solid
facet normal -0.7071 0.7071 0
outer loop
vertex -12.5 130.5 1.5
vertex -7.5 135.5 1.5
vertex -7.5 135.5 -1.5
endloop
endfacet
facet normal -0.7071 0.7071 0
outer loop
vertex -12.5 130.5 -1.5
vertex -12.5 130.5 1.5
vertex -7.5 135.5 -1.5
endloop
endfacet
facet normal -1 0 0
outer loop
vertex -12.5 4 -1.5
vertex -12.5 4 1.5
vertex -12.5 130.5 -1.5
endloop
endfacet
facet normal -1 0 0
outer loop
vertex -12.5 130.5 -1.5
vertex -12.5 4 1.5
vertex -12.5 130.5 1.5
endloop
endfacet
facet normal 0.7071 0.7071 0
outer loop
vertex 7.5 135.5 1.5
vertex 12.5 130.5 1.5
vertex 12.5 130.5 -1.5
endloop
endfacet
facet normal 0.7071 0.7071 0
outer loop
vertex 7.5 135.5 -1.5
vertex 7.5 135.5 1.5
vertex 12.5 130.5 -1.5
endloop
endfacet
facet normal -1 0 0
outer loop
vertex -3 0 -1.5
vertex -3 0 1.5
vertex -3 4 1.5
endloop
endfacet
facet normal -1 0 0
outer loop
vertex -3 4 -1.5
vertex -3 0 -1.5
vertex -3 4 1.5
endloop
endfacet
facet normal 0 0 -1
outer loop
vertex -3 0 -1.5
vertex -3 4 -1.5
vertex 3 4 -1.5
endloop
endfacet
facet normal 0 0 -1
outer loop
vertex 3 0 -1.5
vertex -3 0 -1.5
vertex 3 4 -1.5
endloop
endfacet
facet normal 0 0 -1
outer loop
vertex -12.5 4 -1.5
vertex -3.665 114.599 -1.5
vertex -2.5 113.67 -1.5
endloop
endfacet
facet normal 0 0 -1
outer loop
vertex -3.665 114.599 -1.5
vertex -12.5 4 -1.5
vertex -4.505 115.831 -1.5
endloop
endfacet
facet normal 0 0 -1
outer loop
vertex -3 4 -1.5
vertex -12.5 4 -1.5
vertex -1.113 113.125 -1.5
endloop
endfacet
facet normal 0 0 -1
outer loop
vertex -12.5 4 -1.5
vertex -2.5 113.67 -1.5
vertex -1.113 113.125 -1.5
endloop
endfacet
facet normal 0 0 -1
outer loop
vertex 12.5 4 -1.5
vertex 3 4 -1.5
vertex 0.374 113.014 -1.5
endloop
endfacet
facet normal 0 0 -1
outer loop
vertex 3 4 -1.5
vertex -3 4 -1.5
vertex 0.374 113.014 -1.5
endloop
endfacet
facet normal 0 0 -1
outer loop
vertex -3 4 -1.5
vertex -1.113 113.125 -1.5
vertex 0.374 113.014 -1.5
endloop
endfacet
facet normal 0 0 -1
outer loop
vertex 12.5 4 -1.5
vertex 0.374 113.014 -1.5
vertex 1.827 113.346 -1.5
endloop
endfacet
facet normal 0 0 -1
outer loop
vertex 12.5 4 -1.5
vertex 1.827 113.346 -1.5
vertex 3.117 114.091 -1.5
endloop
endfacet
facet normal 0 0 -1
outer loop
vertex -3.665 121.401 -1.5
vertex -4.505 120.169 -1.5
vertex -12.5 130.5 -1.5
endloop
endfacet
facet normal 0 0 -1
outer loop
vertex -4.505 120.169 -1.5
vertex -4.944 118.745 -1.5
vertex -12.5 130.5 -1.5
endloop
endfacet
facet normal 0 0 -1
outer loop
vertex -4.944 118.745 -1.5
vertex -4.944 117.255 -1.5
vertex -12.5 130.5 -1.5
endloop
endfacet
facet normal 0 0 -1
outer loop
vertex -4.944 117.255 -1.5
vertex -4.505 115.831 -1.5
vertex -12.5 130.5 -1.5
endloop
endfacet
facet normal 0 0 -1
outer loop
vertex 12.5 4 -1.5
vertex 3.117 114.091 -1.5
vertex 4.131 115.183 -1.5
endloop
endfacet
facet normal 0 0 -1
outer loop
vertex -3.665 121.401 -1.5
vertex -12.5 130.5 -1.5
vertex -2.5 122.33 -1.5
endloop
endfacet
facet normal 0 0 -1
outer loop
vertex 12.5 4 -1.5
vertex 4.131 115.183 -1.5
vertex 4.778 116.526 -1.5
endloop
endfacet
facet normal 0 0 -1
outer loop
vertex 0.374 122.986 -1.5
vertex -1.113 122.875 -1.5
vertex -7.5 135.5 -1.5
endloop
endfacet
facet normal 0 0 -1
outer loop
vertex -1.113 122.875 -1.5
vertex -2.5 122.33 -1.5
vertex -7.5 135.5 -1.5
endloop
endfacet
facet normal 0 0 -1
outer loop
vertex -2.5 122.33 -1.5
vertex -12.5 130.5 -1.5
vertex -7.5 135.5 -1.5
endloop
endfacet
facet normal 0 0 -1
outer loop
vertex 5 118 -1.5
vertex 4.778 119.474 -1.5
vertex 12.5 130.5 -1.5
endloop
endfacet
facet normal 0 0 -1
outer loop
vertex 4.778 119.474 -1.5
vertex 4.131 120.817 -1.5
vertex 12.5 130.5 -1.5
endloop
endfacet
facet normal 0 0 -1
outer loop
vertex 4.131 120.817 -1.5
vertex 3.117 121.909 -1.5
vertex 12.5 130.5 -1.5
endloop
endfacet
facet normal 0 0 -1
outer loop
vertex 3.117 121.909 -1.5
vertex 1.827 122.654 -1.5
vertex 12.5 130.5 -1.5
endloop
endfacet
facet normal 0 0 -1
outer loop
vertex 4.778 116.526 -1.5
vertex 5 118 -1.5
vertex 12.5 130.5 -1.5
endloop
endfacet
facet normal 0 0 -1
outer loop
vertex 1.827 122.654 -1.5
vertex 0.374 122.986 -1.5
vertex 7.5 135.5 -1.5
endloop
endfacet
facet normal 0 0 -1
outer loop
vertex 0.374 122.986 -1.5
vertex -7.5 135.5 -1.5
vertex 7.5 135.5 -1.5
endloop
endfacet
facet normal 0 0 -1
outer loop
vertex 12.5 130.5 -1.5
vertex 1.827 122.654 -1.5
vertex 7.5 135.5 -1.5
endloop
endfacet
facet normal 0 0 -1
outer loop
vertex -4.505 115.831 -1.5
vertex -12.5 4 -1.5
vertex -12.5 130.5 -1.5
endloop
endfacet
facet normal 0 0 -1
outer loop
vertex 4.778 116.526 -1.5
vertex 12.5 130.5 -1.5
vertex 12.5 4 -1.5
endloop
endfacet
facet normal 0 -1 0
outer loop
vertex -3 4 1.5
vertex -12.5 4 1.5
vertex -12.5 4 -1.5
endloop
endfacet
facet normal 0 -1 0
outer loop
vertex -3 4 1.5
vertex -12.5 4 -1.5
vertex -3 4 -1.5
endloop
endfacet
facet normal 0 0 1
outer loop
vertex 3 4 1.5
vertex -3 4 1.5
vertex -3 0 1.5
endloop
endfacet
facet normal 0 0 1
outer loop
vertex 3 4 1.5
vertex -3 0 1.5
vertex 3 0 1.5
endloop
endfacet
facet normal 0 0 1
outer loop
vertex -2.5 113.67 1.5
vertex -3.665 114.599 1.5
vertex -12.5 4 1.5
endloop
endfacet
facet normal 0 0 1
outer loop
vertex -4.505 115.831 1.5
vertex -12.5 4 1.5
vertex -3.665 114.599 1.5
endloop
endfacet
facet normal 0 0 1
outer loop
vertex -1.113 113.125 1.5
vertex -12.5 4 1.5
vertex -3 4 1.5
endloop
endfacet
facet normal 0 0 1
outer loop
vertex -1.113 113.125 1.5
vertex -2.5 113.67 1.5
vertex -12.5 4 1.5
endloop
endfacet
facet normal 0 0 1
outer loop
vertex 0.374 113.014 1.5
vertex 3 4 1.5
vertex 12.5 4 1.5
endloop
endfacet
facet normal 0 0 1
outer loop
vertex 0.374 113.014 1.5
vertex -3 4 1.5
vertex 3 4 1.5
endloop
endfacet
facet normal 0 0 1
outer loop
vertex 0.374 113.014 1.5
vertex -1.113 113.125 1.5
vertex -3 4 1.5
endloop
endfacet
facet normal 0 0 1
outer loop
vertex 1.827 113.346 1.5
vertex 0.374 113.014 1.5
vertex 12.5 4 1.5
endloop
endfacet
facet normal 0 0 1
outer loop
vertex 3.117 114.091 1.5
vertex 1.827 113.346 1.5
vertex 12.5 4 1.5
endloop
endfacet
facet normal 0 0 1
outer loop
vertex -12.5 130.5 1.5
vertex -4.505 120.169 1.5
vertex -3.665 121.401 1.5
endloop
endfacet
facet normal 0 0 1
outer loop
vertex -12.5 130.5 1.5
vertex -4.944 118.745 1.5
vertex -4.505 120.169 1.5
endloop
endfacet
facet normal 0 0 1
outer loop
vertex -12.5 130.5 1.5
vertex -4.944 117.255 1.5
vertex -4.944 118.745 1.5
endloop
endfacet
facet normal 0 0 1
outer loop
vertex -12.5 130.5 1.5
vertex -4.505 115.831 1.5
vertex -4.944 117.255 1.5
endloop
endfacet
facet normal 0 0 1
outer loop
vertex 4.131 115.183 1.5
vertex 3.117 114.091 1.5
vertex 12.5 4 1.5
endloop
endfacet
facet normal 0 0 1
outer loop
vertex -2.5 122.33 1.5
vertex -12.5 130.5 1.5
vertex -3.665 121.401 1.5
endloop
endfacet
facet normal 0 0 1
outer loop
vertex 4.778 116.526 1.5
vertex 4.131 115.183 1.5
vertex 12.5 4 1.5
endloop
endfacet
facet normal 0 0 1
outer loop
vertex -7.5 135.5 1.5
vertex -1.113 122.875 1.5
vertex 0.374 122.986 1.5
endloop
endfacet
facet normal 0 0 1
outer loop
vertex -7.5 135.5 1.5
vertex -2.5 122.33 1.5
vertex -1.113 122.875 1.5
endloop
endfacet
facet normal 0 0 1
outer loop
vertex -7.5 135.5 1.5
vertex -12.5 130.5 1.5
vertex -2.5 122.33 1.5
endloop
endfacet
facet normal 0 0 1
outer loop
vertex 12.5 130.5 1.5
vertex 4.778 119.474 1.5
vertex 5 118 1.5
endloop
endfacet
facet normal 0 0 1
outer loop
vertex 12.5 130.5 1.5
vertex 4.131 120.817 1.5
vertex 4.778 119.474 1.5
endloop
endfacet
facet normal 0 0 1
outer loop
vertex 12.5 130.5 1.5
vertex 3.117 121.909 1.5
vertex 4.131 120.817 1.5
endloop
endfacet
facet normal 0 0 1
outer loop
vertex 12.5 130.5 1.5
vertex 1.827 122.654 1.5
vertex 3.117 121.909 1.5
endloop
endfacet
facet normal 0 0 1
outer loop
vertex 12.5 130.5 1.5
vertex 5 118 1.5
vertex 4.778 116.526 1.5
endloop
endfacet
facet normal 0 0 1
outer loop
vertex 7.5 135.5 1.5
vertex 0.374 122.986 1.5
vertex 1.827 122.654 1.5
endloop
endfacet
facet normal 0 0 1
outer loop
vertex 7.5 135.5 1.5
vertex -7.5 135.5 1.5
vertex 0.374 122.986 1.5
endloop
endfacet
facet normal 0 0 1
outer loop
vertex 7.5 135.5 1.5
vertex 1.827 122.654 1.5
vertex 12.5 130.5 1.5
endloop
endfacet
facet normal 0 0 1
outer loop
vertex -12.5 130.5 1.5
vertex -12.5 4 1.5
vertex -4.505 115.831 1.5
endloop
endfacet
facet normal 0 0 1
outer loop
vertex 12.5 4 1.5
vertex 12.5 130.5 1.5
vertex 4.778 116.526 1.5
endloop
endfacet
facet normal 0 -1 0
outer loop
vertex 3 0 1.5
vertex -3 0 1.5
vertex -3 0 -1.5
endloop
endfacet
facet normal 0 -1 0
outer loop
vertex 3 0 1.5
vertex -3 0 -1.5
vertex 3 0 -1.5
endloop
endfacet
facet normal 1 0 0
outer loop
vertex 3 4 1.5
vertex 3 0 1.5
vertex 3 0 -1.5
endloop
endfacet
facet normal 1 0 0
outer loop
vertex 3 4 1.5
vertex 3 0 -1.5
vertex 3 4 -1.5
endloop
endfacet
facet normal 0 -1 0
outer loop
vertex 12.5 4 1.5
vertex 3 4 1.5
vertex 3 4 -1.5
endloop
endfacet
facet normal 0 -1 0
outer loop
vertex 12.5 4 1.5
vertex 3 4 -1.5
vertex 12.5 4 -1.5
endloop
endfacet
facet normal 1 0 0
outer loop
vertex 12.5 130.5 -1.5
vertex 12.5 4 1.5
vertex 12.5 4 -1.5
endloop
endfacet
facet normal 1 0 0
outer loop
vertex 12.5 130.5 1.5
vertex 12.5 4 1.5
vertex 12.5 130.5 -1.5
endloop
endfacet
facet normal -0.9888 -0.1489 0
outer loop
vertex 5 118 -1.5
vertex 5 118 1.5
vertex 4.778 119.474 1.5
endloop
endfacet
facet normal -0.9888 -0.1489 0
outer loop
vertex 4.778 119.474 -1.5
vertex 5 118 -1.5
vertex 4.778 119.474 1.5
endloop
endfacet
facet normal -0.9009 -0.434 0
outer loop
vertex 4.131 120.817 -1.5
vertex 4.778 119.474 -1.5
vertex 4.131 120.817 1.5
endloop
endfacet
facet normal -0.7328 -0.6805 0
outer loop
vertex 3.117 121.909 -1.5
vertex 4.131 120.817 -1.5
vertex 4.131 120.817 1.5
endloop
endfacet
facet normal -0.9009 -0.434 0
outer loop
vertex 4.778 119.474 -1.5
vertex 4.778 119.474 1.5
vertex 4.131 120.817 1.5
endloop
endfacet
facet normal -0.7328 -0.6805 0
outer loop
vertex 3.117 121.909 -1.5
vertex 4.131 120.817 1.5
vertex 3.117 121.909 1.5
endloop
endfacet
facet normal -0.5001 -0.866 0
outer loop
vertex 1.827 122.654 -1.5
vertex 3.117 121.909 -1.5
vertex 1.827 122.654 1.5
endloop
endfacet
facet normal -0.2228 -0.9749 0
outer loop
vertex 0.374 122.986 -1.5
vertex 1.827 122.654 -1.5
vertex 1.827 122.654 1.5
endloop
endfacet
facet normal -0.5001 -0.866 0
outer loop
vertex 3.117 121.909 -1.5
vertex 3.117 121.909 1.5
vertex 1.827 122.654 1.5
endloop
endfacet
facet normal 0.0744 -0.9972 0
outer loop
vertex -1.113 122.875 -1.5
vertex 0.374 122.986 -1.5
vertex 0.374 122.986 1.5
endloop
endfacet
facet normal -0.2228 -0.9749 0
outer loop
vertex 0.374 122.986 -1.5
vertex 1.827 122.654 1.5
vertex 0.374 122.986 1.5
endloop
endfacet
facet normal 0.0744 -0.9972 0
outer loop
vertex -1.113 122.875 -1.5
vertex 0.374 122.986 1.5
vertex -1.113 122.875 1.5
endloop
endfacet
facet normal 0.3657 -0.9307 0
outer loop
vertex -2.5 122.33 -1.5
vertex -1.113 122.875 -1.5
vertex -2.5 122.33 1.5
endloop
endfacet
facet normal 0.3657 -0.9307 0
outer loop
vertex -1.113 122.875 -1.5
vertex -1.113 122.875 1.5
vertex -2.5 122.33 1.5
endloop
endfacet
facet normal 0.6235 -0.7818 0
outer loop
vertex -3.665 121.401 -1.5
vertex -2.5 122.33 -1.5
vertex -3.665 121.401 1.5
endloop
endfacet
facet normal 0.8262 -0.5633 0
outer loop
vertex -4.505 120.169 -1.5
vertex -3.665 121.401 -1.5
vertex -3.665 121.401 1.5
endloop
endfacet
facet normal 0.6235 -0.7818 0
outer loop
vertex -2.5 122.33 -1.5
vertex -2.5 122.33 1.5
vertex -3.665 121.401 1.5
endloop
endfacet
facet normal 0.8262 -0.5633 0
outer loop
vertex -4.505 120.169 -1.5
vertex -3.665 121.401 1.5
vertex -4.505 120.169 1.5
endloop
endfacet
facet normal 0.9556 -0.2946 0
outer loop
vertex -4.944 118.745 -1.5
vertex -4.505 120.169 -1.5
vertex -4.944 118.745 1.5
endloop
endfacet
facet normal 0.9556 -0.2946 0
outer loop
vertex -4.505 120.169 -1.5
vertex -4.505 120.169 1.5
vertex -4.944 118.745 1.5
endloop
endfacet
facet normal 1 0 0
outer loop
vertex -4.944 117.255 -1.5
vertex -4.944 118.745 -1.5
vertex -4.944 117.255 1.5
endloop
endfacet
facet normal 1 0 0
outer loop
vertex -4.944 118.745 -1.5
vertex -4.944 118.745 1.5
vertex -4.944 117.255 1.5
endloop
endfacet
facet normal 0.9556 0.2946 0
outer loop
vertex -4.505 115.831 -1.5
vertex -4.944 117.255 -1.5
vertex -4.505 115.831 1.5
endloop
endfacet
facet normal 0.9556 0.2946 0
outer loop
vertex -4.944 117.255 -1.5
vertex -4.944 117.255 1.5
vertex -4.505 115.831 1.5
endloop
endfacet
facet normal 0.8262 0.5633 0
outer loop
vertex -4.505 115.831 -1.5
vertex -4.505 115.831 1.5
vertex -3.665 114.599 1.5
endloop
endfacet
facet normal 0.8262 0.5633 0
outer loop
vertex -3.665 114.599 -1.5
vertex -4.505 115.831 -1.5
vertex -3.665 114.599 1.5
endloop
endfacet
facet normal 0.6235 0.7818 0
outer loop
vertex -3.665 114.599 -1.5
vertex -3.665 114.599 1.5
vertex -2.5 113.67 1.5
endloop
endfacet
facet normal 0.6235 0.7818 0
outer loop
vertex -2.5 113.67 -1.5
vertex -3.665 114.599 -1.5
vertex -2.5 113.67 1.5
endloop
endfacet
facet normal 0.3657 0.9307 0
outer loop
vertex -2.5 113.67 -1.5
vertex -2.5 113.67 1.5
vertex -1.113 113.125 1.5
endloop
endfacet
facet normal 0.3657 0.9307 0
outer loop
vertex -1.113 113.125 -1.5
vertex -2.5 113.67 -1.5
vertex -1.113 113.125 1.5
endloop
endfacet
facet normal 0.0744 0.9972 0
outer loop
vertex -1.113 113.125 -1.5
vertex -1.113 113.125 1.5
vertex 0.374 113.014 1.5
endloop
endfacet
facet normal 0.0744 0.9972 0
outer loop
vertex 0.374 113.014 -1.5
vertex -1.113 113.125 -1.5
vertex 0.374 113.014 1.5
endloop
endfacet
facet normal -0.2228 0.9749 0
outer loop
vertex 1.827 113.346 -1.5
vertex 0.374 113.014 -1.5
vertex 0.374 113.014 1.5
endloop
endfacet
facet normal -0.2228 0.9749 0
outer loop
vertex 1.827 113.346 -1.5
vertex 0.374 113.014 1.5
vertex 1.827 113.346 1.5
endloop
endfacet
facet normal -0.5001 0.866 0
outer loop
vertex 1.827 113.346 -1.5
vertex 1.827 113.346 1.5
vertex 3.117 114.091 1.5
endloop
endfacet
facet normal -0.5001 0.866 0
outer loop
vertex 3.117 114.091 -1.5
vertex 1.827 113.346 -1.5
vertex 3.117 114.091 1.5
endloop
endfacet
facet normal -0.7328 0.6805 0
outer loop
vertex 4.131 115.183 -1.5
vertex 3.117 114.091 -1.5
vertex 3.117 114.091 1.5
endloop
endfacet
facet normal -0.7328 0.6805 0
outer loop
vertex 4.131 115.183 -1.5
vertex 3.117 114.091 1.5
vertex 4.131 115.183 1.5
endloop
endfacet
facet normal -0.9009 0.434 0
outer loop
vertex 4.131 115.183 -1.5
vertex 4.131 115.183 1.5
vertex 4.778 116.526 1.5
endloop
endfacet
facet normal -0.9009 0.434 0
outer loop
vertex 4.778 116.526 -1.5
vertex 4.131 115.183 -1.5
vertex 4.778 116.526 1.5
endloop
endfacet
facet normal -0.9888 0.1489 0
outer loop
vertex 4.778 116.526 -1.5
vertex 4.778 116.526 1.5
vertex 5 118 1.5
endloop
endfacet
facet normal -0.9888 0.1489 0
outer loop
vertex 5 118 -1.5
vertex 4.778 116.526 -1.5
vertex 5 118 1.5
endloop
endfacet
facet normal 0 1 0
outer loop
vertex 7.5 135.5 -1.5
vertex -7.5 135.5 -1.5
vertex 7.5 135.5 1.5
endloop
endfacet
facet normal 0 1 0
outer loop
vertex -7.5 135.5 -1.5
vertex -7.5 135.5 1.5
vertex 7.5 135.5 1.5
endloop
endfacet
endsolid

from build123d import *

# Parameters (mm, degrees)
SKETCH1_W           = 25
SKETCH1_H           = 135.5
BOSS_EXTRUDE1_DEPTH = 1.5
SKETCH2_R           = 5
CUT_EXTRUDE1_DEPTH  = 137.108412672
CHAMFER1_SIZE       = 5
SKETCH3_W           = 9.5
SKETCH3_H           = 4
CUT_EXTRUDE2_DEPTH  = 137.108412672


with BuildPart() as part:
    # Sketch1 → Boss-Extrude1 (new, symmetric)
    with BuildSketch(Plane.XY):
        with Locations((0, 67.75)):
            Rectangle(SKETCH1_W, SKETCH1_H)
    extrude(amount=BOSS_EXTRUDE1_DEPTH, both=True)

    # Sketch2 → Cut-Extrude1 (cut, through all)
    with BuildSketch(Plane.XY.offset(1.5)):
        with Locations((0, 118)):
            Circle(SKETCH2_R)
    extrude(amount=-CUT_EXTRUDE1_DEPTH, mode=Mode.SUBTRACT)

    # Chamfer1
    chamfer1_edges = [part.edges().sort_by_distance(p)[0] for p in [
        (-12.5, 135.5, 0),
        (12.5, 135.5, 0),
    ]]
    chamfer(chamfer1_edges, length=CHAMFER1_SIZE)

    # Sketch3 → Cut-Extrude2 (cut, through all)
    with BuildSketch(Plane.XY.offset(1.5)):
        with Locations((-7.75, 2)):
            Rectangle(SKETCH3_W, SKETCH3_H)
        with Locations((7.75, 2)):
            Rectangle(SKETCH3_W, SKETCH3_H)
    extrude(amount=-CUT_EXTRUDE2_DEPTH, mode=Mode.SUBTRACT)


solid = part.part
